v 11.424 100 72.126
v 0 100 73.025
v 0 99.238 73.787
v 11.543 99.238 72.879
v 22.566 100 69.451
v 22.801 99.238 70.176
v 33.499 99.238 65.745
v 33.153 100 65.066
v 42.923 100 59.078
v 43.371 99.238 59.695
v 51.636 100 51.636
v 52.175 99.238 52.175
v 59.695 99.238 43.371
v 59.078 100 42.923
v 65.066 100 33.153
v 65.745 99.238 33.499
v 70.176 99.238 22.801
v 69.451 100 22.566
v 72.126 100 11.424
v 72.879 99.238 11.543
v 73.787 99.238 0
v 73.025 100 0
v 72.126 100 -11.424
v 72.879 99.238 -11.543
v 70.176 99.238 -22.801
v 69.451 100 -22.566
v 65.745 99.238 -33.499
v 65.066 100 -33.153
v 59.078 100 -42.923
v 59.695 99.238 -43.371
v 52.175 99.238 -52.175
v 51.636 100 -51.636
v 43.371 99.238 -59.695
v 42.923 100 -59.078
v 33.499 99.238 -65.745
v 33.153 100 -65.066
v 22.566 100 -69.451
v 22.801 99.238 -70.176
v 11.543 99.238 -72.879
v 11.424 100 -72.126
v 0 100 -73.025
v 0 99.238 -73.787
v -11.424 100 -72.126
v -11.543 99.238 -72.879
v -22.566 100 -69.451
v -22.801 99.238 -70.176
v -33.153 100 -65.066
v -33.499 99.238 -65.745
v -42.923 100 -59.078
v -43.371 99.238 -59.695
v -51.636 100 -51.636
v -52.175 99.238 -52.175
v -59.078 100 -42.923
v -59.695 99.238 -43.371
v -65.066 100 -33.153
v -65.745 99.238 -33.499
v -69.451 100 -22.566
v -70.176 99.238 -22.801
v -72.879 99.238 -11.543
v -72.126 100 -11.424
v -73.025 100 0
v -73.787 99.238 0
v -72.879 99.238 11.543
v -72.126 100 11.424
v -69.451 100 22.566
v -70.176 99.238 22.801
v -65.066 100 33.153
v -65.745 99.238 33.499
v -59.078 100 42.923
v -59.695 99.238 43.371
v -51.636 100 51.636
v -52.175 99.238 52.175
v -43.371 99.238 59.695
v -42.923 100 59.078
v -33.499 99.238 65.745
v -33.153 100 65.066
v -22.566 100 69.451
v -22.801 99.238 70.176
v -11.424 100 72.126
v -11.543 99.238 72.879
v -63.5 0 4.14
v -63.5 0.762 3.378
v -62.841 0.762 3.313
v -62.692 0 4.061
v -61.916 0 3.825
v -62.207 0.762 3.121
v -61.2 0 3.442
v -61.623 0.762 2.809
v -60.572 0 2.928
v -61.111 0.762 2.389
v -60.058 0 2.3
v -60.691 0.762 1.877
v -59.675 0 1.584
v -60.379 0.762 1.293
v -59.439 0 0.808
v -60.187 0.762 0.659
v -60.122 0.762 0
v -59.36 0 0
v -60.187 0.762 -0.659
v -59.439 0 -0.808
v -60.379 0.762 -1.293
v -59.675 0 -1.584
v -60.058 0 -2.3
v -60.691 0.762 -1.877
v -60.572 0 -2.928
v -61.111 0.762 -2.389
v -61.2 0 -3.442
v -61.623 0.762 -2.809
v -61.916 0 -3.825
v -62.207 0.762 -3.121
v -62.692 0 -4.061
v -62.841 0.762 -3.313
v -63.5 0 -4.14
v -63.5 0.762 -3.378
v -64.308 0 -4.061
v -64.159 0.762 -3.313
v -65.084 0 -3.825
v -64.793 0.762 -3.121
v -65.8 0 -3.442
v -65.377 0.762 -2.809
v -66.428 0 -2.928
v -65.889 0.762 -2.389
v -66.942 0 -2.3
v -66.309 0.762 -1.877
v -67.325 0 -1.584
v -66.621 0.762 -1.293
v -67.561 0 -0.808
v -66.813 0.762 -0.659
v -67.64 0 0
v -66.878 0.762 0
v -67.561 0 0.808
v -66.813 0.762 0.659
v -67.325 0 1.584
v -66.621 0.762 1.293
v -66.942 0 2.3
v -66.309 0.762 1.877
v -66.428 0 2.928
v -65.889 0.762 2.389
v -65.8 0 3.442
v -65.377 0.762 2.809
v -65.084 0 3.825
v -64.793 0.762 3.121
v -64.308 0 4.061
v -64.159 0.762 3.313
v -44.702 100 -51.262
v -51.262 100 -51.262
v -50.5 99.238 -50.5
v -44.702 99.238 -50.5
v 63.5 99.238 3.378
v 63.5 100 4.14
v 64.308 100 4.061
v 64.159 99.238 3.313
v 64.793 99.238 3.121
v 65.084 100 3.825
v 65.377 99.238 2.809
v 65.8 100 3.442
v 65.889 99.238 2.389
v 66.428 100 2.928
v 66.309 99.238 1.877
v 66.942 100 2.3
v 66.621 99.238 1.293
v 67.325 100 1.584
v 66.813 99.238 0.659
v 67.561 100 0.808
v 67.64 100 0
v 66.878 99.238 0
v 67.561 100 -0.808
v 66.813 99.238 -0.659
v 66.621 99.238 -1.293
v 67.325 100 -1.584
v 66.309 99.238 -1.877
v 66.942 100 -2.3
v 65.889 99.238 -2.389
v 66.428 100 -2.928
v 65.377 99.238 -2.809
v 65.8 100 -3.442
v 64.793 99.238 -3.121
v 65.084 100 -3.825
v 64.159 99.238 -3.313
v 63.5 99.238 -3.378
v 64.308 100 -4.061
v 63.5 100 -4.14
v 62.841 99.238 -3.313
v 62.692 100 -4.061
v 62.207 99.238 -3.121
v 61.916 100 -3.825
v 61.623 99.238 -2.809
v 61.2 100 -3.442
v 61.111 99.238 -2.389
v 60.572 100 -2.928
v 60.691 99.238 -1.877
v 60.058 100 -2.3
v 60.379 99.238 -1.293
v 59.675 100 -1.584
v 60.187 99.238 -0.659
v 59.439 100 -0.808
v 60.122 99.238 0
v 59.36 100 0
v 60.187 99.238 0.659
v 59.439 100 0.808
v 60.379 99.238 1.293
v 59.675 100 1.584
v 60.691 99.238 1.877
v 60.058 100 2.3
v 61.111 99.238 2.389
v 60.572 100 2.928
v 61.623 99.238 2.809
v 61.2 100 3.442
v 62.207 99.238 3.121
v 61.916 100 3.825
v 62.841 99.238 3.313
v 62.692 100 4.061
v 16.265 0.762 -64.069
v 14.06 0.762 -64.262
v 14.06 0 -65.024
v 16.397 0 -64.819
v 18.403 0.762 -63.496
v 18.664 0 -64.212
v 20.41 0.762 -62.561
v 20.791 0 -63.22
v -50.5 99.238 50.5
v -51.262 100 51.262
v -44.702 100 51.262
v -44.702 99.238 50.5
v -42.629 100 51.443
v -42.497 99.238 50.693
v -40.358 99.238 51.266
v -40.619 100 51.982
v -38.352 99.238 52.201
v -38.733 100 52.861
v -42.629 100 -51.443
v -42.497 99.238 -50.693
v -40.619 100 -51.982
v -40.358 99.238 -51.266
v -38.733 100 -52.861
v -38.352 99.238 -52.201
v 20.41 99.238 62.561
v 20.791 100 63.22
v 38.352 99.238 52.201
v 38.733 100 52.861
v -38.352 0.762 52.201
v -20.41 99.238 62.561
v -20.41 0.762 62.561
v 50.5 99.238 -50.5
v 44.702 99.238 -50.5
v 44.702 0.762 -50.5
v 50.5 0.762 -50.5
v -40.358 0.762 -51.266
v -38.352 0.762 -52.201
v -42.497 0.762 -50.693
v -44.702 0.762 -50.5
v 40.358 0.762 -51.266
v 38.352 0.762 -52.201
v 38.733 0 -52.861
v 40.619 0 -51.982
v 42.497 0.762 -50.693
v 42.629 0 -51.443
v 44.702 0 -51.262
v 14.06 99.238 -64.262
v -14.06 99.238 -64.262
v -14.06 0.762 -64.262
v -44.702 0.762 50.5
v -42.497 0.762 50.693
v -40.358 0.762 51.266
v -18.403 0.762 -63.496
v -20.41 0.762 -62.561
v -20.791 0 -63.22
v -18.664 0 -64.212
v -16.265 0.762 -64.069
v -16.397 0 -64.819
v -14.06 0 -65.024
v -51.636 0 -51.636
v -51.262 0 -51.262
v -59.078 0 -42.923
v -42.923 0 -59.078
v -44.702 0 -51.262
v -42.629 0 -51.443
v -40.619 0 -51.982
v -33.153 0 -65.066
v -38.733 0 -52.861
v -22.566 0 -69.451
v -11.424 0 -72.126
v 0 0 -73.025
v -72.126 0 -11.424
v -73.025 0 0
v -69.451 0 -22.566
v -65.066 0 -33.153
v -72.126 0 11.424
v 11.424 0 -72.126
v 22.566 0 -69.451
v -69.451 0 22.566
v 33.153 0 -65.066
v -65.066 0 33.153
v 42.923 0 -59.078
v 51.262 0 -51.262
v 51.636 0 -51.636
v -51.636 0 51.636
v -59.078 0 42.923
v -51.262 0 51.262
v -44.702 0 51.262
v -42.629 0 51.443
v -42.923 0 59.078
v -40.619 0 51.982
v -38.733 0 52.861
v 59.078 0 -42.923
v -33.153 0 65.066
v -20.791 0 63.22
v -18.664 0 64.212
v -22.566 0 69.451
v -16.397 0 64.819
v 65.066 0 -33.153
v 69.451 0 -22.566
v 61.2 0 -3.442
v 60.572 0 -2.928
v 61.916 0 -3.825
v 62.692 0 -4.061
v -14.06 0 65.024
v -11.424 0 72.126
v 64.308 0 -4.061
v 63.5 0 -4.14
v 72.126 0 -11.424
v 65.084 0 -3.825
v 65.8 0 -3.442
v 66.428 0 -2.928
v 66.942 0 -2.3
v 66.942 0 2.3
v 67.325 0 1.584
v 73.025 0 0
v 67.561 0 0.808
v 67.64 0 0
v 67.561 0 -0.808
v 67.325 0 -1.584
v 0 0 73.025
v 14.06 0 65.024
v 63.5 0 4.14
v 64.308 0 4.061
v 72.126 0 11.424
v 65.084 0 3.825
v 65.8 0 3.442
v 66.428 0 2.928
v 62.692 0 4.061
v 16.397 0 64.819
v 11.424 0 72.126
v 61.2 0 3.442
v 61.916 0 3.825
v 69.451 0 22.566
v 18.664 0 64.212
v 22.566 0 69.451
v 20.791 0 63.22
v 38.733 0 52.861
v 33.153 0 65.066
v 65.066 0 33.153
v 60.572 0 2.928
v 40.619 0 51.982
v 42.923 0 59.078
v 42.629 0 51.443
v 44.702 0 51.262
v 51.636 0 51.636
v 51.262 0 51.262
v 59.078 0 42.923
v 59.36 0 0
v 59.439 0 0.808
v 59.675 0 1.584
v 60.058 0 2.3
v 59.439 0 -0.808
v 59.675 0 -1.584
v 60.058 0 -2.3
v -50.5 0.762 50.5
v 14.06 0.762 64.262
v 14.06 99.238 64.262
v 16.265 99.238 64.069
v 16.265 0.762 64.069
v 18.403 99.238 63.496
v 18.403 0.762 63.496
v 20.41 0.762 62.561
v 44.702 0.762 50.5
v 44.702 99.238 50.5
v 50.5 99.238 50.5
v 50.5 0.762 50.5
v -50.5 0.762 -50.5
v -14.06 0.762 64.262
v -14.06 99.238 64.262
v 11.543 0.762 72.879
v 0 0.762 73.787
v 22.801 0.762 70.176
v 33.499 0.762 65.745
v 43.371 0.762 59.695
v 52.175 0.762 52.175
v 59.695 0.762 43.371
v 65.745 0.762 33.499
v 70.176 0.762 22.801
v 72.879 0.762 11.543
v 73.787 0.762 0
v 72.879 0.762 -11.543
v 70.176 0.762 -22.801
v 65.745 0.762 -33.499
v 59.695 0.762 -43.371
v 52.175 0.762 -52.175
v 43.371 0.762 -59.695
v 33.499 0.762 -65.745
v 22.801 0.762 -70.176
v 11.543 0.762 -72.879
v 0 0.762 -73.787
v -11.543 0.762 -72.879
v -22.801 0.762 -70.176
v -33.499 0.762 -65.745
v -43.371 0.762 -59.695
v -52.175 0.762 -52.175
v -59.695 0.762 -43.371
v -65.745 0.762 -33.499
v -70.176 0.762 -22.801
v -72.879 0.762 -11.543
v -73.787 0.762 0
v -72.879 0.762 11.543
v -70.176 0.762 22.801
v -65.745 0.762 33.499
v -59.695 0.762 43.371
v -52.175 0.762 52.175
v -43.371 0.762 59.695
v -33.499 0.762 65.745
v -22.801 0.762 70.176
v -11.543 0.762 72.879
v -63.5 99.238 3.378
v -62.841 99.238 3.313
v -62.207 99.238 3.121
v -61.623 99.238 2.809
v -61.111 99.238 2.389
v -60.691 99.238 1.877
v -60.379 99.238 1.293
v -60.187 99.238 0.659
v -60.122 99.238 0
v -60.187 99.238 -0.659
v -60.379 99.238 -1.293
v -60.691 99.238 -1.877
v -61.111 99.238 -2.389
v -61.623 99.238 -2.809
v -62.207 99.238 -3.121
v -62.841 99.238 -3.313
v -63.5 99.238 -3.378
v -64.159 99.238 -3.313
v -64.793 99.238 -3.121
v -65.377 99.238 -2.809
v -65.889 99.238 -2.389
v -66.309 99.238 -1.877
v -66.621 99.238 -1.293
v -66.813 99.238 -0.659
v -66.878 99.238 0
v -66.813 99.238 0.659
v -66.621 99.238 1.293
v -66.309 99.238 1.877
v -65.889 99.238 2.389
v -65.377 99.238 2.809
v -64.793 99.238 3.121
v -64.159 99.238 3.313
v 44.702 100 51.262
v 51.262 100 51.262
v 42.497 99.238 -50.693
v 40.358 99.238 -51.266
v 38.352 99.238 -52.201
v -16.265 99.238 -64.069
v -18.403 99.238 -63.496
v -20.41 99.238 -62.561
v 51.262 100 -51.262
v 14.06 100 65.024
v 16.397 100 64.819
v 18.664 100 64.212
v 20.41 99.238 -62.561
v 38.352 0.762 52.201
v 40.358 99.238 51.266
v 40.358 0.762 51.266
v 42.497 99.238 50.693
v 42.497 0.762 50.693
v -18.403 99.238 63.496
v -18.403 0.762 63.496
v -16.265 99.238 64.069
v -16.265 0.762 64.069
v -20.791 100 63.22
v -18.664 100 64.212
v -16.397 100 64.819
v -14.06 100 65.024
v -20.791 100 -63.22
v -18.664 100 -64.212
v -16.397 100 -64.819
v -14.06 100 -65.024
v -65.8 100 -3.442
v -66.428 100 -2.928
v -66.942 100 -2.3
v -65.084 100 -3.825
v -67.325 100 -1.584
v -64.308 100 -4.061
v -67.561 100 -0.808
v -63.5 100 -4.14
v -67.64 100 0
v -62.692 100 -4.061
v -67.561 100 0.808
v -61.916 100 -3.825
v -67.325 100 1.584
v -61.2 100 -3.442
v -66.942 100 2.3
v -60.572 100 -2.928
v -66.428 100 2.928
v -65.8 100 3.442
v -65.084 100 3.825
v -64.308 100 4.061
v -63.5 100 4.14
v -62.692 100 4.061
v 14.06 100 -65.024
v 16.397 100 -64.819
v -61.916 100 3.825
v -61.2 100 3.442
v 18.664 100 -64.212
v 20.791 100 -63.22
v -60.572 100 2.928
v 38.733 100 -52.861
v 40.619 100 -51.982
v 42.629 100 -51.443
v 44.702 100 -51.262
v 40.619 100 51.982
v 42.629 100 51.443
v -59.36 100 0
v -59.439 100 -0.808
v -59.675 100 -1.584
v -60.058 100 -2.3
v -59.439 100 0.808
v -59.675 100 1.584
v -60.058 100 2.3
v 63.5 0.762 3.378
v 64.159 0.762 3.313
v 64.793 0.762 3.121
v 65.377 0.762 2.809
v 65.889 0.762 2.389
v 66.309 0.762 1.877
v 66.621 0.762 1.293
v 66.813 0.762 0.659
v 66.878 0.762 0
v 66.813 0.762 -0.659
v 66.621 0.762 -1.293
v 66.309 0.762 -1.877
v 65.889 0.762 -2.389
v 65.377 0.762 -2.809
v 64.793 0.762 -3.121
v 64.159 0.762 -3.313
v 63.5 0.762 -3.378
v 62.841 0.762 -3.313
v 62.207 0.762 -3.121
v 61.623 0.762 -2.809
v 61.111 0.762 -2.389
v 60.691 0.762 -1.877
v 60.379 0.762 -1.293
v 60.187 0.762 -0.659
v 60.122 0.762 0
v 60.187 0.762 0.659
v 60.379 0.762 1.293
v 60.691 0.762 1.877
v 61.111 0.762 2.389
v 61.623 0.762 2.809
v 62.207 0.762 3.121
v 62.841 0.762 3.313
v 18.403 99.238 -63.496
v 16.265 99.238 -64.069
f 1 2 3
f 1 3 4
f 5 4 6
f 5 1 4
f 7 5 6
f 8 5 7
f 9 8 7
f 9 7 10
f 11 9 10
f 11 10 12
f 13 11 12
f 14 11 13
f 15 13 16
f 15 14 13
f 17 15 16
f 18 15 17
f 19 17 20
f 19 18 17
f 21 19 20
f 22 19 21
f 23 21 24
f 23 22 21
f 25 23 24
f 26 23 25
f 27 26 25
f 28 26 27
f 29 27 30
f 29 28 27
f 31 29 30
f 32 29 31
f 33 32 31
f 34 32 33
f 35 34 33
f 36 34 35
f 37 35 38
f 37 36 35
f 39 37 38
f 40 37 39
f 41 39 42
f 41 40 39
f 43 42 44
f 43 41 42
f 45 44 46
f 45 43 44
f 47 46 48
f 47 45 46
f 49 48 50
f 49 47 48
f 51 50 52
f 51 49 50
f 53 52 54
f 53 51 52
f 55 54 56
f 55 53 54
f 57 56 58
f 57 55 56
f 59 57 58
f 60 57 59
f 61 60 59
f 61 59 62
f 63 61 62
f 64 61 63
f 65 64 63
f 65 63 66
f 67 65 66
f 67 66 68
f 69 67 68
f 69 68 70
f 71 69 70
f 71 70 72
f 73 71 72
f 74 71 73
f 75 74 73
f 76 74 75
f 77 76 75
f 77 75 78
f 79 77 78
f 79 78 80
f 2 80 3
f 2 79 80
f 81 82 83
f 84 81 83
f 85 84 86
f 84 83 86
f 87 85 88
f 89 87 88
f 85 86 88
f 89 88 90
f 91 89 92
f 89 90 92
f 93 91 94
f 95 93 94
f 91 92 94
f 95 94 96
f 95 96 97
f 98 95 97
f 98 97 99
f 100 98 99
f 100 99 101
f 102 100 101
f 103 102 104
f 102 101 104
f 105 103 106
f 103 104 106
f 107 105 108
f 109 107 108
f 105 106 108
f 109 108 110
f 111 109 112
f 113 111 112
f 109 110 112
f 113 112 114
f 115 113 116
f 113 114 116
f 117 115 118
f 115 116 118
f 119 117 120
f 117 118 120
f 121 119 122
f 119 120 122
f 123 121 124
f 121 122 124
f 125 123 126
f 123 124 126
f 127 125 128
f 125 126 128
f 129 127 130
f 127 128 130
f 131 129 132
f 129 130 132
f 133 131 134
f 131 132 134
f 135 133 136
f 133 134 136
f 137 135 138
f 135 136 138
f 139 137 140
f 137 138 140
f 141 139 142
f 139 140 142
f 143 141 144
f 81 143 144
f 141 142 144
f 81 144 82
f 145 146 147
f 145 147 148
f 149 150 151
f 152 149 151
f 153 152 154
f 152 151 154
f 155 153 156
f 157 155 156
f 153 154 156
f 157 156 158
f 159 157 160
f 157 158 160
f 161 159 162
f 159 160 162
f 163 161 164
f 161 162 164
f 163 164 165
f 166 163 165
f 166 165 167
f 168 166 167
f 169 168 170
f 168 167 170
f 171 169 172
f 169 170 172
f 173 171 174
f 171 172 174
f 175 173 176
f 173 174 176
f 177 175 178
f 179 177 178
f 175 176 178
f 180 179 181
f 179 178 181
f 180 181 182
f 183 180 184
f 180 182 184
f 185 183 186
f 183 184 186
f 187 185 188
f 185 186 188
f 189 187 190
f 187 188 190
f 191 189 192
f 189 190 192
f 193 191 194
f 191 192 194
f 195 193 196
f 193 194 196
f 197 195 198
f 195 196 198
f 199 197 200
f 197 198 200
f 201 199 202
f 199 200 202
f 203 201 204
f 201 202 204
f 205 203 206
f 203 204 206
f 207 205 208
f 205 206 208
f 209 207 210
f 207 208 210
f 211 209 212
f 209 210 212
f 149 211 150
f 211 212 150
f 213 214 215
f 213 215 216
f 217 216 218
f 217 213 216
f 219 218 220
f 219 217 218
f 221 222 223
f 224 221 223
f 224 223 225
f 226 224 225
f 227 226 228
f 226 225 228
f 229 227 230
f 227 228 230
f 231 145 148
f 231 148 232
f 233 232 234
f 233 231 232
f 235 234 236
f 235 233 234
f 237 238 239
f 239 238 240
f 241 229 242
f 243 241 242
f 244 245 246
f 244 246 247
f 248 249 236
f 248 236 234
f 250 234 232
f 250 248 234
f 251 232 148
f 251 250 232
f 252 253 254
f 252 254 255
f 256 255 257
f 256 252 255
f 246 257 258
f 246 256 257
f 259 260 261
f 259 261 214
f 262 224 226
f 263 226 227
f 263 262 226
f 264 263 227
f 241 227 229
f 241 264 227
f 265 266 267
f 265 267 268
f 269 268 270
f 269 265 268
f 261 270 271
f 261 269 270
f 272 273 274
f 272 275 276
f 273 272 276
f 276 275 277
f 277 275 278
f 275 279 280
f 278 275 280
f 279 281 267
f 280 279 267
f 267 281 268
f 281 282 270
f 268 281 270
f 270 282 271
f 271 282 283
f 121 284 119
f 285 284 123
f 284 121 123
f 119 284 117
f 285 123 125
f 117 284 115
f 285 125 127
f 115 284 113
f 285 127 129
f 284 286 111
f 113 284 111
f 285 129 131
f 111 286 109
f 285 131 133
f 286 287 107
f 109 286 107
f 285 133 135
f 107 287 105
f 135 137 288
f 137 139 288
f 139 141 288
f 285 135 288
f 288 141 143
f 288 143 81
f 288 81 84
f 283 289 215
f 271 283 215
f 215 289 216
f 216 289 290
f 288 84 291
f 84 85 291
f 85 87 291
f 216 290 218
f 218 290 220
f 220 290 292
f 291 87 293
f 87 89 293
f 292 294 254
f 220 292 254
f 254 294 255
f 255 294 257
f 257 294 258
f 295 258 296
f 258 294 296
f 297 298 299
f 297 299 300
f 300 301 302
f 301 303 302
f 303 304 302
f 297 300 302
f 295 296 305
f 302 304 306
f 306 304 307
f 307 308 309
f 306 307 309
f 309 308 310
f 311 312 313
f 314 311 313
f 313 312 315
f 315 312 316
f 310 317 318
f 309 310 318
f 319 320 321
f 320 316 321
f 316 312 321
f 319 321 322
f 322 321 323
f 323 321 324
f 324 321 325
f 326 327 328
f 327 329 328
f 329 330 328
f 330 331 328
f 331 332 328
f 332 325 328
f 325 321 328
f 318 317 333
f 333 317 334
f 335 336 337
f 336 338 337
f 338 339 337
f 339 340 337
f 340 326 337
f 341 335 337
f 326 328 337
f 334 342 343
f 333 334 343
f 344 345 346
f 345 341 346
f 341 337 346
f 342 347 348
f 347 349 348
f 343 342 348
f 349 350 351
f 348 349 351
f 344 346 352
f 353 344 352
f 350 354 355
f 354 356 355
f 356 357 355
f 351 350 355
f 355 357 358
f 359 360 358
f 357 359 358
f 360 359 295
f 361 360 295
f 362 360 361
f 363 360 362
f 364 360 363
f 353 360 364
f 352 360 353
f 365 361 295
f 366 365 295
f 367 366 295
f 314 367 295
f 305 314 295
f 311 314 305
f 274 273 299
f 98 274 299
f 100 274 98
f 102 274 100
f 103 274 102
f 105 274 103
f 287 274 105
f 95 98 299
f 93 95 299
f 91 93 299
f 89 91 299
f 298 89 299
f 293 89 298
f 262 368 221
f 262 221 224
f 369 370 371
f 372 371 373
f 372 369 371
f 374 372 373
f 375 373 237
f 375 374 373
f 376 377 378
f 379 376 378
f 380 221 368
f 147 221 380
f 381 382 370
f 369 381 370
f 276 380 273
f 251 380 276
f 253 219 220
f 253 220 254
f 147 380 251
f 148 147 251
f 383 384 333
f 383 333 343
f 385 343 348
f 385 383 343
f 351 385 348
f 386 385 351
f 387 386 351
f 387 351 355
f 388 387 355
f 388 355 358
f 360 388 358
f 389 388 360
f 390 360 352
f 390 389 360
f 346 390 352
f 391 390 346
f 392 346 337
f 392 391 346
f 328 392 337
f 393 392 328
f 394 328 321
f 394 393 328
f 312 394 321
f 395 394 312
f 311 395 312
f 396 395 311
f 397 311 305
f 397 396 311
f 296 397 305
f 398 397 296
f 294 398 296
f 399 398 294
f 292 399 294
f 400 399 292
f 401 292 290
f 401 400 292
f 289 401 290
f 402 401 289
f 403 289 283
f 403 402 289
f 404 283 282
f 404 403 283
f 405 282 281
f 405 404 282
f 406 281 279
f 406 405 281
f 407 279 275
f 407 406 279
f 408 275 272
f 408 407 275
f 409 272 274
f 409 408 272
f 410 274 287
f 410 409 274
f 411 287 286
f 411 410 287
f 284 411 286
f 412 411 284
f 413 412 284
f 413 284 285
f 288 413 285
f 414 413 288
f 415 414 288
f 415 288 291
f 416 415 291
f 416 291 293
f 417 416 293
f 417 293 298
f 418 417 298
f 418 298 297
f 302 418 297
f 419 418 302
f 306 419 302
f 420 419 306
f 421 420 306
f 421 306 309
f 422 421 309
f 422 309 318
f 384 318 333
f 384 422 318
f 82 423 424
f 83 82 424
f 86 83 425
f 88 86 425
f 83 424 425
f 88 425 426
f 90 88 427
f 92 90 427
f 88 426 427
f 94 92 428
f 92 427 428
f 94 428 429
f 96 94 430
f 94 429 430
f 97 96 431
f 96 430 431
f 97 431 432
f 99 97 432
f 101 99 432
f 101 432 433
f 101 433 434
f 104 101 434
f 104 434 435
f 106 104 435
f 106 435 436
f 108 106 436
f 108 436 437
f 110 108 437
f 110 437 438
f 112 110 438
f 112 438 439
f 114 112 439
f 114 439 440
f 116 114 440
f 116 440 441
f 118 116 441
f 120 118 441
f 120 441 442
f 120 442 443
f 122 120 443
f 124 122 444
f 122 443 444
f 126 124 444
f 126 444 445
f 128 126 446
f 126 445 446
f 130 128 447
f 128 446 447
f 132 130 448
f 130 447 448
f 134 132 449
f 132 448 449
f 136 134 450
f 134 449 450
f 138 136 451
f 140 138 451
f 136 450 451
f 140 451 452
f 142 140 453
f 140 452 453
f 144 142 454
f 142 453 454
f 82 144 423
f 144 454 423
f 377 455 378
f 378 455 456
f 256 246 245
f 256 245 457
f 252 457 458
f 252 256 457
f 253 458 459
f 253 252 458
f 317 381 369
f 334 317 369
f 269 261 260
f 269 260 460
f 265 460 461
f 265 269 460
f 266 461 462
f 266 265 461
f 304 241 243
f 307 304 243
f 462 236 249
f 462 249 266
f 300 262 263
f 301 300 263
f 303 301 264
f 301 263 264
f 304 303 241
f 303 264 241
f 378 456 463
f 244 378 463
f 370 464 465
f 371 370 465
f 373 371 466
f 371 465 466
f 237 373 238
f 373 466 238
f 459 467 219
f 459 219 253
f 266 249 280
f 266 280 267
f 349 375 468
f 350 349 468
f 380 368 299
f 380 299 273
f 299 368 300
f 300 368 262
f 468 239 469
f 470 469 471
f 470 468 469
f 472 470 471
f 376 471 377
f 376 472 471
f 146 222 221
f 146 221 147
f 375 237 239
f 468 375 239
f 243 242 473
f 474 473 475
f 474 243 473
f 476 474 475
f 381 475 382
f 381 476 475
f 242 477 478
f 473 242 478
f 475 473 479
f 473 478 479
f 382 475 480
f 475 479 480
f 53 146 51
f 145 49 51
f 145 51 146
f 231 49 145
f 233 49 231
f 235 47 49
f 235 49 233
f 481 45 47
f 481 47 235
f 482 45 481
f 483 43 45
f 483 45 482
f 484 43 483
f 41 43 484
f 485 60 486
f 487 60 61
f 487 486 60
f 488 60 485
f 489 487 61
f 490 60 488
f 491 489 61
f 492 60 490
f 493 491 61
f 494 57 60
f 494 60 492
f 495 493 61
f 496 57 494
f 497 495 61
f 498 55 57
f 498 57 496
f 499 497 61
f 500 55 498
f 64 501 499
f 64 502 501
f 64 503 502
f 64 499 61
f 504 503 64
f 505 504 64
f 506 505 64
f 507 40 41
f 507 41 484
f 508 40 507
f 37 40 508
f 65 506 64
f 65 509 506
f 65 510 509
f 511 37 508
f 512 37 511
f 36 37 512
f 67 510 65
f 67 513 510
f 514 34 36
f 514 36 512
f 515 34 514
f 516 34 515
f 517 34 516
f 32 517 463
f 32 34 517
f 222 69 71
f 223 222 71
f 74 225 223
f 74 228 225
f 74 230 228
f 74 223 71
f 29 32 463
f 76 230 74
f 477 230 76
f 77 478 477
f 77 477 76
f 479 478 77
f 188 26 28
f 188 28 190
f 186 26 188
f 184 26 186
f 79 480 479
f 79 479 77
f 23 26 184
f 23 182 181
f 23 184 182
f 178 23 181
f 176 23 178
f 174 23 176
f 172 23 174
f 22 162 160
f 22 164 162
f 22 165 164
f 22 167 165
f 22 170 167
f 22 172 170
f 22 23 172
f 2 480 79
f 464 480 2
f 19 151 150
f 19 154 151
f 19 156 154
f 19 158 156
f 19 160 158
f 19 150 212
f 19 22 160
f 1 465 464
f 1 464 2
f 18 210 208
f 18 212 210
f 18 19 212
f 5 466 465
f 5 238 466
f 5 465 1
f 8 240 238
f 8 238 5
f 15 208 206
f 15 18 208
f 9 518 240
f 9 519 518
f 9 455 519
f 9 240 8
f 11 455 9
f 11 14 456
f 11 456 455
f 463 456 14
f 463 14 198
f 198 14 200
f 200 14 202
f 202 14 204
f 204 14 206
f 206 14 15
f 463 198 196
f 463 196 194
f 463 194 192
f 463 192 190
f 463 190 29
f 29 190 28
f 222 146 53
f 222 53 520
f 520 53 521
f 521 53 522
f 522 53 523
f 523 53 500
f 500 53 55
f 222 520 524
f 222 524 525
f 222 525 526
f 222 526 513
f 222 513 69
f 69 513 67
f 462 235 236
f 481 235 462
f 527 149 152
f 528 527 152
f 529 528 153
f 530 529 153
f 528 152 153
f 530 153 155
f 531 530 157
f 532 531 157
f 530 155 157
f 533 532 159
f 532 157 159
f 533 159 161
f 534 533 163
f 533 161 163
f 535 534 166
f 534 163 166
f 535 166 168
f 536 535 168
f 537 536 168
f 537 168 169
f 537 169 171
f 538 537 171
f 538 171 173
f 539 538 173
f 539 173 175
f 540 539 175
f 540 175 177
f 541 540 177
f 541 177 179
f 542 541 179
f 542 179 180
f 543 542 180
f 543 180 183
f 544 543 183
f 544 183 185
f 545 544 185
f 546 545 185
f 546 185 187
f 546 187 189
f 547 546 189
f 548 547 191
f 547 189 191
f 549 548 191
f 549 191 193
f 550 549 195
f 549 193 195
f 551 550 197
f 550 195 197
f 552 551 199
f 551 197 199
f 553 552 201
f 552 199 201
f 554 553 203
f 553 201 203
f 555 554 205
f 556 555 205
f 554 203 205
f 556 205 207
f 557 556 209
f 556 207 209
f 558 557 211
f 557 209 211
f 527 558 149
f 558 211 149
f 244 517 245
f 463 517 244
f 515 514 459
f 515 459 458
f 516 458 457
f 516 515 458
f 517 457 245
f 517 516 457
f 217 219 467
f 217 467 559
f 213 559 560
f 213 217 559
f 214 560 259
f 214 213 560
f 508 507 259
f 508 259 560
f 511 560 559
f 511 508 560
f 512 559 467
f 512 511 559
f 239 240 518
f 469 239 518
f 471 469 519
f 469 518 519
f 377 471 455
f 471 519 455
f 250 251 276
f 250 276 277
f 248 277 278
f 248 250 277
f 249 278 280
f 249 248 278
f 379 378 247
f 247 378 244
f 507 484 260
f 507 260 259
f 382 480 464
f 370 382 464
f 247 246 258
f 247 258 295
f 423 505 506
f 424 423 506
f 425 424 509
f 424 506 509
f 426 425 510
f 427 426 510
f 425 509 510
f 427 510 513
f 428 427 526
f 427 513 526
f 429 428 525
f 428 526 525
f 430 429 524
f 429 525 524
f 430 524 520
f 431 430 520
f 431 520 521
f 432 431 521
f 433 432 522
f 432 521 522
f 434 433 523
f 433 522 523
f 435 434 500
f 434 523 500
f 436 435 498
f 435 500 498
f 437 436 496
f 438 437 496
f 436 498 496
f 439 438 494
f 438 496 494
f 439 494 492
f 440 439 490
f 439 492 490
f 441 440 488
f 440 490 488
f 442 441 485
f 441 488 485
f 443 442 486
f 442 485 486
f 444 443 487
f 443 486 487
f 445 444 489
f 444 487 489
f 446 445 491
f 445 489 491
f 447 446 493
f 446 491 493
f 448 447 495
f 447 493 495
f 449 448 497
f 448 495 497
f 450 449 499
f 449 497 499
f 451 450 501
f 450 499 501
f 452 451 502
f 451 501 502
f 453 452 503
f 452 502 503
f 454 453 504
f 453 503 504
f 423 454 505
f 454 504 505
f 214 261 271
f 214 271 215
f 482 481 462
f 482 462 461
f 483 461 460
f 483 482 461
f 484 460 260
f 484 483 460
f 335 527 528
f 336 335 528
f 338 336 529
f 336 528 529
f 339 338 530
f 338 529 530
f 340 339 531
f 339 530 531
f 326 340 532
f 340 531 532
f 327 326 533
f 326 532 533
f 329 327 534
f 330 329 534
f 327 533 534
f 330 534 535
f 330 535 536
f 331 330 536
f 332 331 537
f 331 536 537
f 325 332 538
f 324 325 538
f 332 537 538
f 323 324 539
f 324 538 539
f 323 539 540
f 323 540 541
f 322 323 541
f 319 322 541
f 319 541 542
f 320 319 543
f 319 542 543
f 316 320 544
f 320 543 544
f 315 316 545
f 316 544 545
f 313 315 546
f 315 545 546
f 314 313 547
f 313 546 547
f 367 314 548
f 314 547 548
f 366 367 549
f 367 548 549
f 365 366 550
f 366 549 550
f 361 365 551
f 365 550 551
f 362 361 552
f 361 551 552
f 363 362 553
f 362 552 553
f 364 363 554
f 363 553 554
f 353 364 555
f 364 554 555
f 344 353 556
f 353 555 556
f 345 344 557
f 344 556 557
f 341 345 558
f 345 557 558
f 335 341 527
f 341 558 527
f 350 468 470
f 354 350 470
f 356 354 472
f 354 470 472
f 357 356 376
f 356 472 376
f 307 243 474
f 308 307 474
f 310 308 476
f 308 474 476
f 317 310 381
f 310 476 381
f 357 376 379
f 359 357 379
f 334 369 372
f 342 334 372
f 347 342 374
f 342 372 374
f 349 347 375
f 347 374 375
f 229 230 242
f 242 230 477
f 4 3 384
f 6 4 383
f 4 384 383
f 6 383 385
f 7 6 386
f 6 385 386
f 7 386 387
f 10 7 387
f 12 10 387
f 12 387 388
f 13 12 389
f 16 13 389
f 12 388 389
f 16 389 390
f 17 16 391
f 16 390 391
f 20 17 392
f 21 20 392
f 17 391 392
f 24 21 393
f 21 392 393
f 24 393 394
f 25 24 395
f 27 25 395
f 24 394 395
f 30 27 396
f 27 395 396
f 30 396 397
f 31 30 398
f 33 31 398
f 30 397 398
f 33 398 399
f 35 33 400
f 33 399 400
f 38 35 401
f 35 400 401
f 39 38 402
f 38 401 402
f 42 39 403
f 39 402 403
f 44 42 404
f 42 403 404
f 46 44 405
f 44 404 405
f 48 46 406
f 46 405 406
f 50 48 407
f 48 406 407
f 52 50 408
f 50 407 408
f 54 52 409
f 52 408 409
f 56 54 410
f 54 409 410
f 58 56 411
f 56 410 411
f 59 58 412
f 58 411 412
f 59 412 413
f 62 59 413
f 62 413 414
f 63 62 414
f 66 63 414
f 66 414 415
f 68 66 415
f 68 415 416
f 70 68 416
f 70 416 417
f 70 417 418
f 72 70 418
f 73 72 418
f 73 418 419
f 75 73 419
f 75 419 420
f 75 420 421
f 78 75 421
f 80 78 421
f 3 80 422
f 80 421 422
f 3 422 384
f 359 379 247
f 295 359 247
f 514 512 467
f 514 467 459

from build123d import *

# Parameters (mm, degrees)
HOLDER_SECTION_PROFILE_R    = 73.787
HOLDER_SECTION_BODY_DEPTH   = 100
PAYLOAD_HOLE_PROFILE_W      = 101
PAYLOAD_HOLE_PROFILE_H      = 101
PAYLOAD_HOLE_CUT_DEPTH      = 145.530421497
ACCESS_HOLE_CUT_DEPTH       = 145.530421497
FILLET1_R                   = 12.7
THREADED_ROD_HOLE_PROFILE_R = 3.3782
THREADED_ROD_HOLE_CUT_DEPTH = 145.530421497
CHAMFER1_SIZE               = 0.762


with BuildPart() as part:
    # Holder Section Profile → Holder Section Body (new body)
    with BuildSketch(Plane(origin=(0, 0, 0), x_dir=(1, 0, 0), z_dir=(0, 1, 0))):
        with Locations(Location((0, 0, 0), (0, 0, 270))):
            Circle(HOLDER_SECTION_PROFILE_R)
    extrude(amount=HOLDER_SECTION_BODY_DEPTH)

    # Payload Hole Profile → Payload Hole Cut (cut, through all)
    with BuildSketch(Plane(origin=(0, 100, 0), x_dir=(1, 0, 0), z_dir=(0, 1, 0))):
        Rectangle(PAYLOAD_HOLE_PROFILE_W, PAYLOAD_HOLE_PROFILE_H)
    extrude(amount=-PAYLOAD_HOLE_CUT_DEPTH, mode=Mode.SUBTRACT)

    # Access Hole Profile → Access Hole Cut (cut, through all)
    with BuildSketch(Plane(origin=(0, 100, 0), x_dir=(1, 0, 0), z_dir=(0, 1, 0))):
        Polygon((-17.4625, -64.2619994), (17.4625, -64.2619994), (41.298982175, -50.5), (-41.298982175, -50.5), align=None)
    access_hole_cut = extrude(amount=-ACCESS_HOLE_CUT_DEPTH, mode=Mode.SUBTRACT)

    # Access Hole Mirror: Access Hole Cut across plane
    add(access_hole_cut.mirror(Plane(origin=(0, 0, 0), x_dir=(1, 0, 0), z_dir=(0, 0, -1))), mode=Mode.SUBTRACT)

    # Fillet1
    fillet1_edges = [part.edges().sort_by_distance(p)[0] for p in [
        (-17.4625, 50, 64.2619994),
        (-41.298982175, 50, 50.5),
        (41.298982175, 50, 50.5),
        (17.4625, 50, 64.2619994),
        (-41.298982175, 50, -50.5),
        (-17.4625, 50, -64.2619994),
        (17.4625, 50, -64.2619994),
        (41.298982175, 50, -50.5),
    ]]
    fillet(fillet1_edges, radius=FILLET1_R)

    # Threaded Rod Hole Profile → Threaded Rod Hole Cut (cut, through all)
    with BuildSketch(Plane(origin=(0, 100, 0), x_dir=(1, 0, 0), z_dir=(0, 1, 0))):
        with Locations(Location((-63.5, 0, 0), (0, 0, 270))):
            Circle(THREADED_ROD_HOLE_PROFILE_R)
        with Locations(Location((63.5, 0, 0), (0, 0, 270))):
            Circle(THREADED_ROD_HOLE_PROFILE_R)
    extrude(amount=-THREADED_ROD_HOLE_CUT_DEPTH, mode=Mode.SUBTRACT)

    # Chamfer1
    chamfer1_edges = [part.edges().sort_by_distance(p)[0] for p in [
        (50.5, 0, 0),
        (-47.600968459, 0, 50.5),
        (-50.5, 0, 0),
        (47.600968459, 0, -50.5),
        (50.5, 100, 0),
        (-63.5, 0, -3.3782),
        (-63.5, 100, -3.3782),
        (63.5, 0, -3.3782),
        (47.600968459, 100, -50.5),
        (63.5, 100, -3.3782),
        (-50.5, 100, 0),
        (-47.600968459, 100, 50.5),
        (0, 0, -73.787),
        (0, 100, -73.787),
        (29.380741087, 100, 57.3809997),
        (29.380741087, 0, 57.3809997),
        (0, 100, 64.2619994),
        (0, 0, 64.2619994),
        (47.600968459, 0, 50.5),
        (47.600968459, 100, 50.5),
        (-47.600968459, 100, -50.5),
        (-29.380741087, 100, -57.3809997),
        (0, 100, -64.2619994),
        (29.380741087, 100, -57.3809997),
        (-29.380741087, 100, 57.3809997),
        (-41.414935046, 100, -50.932742006),
        (41.414935046, 100, -50.932742006),
        (-41.414935046, 100, 50.932742006),
        (41.414935046, 100, 50.932742006),
        (-29.380741087, 0, -57.3809997),
        (-47.600968459, 0, -50.5),
        (-29.380741087, 0, 57.3809997),
        (29.380741087, 0, -57.3809997),
        (0, 0, -64.2619994),
        (-41.414935046, 0, -50.932742006),
        (41.414935046, 0, -50.932742006),
        (-41.414935046, 0, 50.932742006),
        (41.414935046, 0, 50.932742006),
        (17.346547129, 100, 63.829257394),
        (17.346547129, 0, 63.829257394),
        (-17.346547129, 100, 63.829257394),
        (-17.346547129, 0, 63.829257394),
        (17.346547129, 100, -63.829257394),
        (17.346547129, 0, -63.829257394),
        (-17.346547129, 100, -63.829257394),
        (-17.346547129, 0, -63.829257394),
    ]]
    chamfer(chamfer1_edges, length=CHAMFER1_SIZE)


solid = part.part
